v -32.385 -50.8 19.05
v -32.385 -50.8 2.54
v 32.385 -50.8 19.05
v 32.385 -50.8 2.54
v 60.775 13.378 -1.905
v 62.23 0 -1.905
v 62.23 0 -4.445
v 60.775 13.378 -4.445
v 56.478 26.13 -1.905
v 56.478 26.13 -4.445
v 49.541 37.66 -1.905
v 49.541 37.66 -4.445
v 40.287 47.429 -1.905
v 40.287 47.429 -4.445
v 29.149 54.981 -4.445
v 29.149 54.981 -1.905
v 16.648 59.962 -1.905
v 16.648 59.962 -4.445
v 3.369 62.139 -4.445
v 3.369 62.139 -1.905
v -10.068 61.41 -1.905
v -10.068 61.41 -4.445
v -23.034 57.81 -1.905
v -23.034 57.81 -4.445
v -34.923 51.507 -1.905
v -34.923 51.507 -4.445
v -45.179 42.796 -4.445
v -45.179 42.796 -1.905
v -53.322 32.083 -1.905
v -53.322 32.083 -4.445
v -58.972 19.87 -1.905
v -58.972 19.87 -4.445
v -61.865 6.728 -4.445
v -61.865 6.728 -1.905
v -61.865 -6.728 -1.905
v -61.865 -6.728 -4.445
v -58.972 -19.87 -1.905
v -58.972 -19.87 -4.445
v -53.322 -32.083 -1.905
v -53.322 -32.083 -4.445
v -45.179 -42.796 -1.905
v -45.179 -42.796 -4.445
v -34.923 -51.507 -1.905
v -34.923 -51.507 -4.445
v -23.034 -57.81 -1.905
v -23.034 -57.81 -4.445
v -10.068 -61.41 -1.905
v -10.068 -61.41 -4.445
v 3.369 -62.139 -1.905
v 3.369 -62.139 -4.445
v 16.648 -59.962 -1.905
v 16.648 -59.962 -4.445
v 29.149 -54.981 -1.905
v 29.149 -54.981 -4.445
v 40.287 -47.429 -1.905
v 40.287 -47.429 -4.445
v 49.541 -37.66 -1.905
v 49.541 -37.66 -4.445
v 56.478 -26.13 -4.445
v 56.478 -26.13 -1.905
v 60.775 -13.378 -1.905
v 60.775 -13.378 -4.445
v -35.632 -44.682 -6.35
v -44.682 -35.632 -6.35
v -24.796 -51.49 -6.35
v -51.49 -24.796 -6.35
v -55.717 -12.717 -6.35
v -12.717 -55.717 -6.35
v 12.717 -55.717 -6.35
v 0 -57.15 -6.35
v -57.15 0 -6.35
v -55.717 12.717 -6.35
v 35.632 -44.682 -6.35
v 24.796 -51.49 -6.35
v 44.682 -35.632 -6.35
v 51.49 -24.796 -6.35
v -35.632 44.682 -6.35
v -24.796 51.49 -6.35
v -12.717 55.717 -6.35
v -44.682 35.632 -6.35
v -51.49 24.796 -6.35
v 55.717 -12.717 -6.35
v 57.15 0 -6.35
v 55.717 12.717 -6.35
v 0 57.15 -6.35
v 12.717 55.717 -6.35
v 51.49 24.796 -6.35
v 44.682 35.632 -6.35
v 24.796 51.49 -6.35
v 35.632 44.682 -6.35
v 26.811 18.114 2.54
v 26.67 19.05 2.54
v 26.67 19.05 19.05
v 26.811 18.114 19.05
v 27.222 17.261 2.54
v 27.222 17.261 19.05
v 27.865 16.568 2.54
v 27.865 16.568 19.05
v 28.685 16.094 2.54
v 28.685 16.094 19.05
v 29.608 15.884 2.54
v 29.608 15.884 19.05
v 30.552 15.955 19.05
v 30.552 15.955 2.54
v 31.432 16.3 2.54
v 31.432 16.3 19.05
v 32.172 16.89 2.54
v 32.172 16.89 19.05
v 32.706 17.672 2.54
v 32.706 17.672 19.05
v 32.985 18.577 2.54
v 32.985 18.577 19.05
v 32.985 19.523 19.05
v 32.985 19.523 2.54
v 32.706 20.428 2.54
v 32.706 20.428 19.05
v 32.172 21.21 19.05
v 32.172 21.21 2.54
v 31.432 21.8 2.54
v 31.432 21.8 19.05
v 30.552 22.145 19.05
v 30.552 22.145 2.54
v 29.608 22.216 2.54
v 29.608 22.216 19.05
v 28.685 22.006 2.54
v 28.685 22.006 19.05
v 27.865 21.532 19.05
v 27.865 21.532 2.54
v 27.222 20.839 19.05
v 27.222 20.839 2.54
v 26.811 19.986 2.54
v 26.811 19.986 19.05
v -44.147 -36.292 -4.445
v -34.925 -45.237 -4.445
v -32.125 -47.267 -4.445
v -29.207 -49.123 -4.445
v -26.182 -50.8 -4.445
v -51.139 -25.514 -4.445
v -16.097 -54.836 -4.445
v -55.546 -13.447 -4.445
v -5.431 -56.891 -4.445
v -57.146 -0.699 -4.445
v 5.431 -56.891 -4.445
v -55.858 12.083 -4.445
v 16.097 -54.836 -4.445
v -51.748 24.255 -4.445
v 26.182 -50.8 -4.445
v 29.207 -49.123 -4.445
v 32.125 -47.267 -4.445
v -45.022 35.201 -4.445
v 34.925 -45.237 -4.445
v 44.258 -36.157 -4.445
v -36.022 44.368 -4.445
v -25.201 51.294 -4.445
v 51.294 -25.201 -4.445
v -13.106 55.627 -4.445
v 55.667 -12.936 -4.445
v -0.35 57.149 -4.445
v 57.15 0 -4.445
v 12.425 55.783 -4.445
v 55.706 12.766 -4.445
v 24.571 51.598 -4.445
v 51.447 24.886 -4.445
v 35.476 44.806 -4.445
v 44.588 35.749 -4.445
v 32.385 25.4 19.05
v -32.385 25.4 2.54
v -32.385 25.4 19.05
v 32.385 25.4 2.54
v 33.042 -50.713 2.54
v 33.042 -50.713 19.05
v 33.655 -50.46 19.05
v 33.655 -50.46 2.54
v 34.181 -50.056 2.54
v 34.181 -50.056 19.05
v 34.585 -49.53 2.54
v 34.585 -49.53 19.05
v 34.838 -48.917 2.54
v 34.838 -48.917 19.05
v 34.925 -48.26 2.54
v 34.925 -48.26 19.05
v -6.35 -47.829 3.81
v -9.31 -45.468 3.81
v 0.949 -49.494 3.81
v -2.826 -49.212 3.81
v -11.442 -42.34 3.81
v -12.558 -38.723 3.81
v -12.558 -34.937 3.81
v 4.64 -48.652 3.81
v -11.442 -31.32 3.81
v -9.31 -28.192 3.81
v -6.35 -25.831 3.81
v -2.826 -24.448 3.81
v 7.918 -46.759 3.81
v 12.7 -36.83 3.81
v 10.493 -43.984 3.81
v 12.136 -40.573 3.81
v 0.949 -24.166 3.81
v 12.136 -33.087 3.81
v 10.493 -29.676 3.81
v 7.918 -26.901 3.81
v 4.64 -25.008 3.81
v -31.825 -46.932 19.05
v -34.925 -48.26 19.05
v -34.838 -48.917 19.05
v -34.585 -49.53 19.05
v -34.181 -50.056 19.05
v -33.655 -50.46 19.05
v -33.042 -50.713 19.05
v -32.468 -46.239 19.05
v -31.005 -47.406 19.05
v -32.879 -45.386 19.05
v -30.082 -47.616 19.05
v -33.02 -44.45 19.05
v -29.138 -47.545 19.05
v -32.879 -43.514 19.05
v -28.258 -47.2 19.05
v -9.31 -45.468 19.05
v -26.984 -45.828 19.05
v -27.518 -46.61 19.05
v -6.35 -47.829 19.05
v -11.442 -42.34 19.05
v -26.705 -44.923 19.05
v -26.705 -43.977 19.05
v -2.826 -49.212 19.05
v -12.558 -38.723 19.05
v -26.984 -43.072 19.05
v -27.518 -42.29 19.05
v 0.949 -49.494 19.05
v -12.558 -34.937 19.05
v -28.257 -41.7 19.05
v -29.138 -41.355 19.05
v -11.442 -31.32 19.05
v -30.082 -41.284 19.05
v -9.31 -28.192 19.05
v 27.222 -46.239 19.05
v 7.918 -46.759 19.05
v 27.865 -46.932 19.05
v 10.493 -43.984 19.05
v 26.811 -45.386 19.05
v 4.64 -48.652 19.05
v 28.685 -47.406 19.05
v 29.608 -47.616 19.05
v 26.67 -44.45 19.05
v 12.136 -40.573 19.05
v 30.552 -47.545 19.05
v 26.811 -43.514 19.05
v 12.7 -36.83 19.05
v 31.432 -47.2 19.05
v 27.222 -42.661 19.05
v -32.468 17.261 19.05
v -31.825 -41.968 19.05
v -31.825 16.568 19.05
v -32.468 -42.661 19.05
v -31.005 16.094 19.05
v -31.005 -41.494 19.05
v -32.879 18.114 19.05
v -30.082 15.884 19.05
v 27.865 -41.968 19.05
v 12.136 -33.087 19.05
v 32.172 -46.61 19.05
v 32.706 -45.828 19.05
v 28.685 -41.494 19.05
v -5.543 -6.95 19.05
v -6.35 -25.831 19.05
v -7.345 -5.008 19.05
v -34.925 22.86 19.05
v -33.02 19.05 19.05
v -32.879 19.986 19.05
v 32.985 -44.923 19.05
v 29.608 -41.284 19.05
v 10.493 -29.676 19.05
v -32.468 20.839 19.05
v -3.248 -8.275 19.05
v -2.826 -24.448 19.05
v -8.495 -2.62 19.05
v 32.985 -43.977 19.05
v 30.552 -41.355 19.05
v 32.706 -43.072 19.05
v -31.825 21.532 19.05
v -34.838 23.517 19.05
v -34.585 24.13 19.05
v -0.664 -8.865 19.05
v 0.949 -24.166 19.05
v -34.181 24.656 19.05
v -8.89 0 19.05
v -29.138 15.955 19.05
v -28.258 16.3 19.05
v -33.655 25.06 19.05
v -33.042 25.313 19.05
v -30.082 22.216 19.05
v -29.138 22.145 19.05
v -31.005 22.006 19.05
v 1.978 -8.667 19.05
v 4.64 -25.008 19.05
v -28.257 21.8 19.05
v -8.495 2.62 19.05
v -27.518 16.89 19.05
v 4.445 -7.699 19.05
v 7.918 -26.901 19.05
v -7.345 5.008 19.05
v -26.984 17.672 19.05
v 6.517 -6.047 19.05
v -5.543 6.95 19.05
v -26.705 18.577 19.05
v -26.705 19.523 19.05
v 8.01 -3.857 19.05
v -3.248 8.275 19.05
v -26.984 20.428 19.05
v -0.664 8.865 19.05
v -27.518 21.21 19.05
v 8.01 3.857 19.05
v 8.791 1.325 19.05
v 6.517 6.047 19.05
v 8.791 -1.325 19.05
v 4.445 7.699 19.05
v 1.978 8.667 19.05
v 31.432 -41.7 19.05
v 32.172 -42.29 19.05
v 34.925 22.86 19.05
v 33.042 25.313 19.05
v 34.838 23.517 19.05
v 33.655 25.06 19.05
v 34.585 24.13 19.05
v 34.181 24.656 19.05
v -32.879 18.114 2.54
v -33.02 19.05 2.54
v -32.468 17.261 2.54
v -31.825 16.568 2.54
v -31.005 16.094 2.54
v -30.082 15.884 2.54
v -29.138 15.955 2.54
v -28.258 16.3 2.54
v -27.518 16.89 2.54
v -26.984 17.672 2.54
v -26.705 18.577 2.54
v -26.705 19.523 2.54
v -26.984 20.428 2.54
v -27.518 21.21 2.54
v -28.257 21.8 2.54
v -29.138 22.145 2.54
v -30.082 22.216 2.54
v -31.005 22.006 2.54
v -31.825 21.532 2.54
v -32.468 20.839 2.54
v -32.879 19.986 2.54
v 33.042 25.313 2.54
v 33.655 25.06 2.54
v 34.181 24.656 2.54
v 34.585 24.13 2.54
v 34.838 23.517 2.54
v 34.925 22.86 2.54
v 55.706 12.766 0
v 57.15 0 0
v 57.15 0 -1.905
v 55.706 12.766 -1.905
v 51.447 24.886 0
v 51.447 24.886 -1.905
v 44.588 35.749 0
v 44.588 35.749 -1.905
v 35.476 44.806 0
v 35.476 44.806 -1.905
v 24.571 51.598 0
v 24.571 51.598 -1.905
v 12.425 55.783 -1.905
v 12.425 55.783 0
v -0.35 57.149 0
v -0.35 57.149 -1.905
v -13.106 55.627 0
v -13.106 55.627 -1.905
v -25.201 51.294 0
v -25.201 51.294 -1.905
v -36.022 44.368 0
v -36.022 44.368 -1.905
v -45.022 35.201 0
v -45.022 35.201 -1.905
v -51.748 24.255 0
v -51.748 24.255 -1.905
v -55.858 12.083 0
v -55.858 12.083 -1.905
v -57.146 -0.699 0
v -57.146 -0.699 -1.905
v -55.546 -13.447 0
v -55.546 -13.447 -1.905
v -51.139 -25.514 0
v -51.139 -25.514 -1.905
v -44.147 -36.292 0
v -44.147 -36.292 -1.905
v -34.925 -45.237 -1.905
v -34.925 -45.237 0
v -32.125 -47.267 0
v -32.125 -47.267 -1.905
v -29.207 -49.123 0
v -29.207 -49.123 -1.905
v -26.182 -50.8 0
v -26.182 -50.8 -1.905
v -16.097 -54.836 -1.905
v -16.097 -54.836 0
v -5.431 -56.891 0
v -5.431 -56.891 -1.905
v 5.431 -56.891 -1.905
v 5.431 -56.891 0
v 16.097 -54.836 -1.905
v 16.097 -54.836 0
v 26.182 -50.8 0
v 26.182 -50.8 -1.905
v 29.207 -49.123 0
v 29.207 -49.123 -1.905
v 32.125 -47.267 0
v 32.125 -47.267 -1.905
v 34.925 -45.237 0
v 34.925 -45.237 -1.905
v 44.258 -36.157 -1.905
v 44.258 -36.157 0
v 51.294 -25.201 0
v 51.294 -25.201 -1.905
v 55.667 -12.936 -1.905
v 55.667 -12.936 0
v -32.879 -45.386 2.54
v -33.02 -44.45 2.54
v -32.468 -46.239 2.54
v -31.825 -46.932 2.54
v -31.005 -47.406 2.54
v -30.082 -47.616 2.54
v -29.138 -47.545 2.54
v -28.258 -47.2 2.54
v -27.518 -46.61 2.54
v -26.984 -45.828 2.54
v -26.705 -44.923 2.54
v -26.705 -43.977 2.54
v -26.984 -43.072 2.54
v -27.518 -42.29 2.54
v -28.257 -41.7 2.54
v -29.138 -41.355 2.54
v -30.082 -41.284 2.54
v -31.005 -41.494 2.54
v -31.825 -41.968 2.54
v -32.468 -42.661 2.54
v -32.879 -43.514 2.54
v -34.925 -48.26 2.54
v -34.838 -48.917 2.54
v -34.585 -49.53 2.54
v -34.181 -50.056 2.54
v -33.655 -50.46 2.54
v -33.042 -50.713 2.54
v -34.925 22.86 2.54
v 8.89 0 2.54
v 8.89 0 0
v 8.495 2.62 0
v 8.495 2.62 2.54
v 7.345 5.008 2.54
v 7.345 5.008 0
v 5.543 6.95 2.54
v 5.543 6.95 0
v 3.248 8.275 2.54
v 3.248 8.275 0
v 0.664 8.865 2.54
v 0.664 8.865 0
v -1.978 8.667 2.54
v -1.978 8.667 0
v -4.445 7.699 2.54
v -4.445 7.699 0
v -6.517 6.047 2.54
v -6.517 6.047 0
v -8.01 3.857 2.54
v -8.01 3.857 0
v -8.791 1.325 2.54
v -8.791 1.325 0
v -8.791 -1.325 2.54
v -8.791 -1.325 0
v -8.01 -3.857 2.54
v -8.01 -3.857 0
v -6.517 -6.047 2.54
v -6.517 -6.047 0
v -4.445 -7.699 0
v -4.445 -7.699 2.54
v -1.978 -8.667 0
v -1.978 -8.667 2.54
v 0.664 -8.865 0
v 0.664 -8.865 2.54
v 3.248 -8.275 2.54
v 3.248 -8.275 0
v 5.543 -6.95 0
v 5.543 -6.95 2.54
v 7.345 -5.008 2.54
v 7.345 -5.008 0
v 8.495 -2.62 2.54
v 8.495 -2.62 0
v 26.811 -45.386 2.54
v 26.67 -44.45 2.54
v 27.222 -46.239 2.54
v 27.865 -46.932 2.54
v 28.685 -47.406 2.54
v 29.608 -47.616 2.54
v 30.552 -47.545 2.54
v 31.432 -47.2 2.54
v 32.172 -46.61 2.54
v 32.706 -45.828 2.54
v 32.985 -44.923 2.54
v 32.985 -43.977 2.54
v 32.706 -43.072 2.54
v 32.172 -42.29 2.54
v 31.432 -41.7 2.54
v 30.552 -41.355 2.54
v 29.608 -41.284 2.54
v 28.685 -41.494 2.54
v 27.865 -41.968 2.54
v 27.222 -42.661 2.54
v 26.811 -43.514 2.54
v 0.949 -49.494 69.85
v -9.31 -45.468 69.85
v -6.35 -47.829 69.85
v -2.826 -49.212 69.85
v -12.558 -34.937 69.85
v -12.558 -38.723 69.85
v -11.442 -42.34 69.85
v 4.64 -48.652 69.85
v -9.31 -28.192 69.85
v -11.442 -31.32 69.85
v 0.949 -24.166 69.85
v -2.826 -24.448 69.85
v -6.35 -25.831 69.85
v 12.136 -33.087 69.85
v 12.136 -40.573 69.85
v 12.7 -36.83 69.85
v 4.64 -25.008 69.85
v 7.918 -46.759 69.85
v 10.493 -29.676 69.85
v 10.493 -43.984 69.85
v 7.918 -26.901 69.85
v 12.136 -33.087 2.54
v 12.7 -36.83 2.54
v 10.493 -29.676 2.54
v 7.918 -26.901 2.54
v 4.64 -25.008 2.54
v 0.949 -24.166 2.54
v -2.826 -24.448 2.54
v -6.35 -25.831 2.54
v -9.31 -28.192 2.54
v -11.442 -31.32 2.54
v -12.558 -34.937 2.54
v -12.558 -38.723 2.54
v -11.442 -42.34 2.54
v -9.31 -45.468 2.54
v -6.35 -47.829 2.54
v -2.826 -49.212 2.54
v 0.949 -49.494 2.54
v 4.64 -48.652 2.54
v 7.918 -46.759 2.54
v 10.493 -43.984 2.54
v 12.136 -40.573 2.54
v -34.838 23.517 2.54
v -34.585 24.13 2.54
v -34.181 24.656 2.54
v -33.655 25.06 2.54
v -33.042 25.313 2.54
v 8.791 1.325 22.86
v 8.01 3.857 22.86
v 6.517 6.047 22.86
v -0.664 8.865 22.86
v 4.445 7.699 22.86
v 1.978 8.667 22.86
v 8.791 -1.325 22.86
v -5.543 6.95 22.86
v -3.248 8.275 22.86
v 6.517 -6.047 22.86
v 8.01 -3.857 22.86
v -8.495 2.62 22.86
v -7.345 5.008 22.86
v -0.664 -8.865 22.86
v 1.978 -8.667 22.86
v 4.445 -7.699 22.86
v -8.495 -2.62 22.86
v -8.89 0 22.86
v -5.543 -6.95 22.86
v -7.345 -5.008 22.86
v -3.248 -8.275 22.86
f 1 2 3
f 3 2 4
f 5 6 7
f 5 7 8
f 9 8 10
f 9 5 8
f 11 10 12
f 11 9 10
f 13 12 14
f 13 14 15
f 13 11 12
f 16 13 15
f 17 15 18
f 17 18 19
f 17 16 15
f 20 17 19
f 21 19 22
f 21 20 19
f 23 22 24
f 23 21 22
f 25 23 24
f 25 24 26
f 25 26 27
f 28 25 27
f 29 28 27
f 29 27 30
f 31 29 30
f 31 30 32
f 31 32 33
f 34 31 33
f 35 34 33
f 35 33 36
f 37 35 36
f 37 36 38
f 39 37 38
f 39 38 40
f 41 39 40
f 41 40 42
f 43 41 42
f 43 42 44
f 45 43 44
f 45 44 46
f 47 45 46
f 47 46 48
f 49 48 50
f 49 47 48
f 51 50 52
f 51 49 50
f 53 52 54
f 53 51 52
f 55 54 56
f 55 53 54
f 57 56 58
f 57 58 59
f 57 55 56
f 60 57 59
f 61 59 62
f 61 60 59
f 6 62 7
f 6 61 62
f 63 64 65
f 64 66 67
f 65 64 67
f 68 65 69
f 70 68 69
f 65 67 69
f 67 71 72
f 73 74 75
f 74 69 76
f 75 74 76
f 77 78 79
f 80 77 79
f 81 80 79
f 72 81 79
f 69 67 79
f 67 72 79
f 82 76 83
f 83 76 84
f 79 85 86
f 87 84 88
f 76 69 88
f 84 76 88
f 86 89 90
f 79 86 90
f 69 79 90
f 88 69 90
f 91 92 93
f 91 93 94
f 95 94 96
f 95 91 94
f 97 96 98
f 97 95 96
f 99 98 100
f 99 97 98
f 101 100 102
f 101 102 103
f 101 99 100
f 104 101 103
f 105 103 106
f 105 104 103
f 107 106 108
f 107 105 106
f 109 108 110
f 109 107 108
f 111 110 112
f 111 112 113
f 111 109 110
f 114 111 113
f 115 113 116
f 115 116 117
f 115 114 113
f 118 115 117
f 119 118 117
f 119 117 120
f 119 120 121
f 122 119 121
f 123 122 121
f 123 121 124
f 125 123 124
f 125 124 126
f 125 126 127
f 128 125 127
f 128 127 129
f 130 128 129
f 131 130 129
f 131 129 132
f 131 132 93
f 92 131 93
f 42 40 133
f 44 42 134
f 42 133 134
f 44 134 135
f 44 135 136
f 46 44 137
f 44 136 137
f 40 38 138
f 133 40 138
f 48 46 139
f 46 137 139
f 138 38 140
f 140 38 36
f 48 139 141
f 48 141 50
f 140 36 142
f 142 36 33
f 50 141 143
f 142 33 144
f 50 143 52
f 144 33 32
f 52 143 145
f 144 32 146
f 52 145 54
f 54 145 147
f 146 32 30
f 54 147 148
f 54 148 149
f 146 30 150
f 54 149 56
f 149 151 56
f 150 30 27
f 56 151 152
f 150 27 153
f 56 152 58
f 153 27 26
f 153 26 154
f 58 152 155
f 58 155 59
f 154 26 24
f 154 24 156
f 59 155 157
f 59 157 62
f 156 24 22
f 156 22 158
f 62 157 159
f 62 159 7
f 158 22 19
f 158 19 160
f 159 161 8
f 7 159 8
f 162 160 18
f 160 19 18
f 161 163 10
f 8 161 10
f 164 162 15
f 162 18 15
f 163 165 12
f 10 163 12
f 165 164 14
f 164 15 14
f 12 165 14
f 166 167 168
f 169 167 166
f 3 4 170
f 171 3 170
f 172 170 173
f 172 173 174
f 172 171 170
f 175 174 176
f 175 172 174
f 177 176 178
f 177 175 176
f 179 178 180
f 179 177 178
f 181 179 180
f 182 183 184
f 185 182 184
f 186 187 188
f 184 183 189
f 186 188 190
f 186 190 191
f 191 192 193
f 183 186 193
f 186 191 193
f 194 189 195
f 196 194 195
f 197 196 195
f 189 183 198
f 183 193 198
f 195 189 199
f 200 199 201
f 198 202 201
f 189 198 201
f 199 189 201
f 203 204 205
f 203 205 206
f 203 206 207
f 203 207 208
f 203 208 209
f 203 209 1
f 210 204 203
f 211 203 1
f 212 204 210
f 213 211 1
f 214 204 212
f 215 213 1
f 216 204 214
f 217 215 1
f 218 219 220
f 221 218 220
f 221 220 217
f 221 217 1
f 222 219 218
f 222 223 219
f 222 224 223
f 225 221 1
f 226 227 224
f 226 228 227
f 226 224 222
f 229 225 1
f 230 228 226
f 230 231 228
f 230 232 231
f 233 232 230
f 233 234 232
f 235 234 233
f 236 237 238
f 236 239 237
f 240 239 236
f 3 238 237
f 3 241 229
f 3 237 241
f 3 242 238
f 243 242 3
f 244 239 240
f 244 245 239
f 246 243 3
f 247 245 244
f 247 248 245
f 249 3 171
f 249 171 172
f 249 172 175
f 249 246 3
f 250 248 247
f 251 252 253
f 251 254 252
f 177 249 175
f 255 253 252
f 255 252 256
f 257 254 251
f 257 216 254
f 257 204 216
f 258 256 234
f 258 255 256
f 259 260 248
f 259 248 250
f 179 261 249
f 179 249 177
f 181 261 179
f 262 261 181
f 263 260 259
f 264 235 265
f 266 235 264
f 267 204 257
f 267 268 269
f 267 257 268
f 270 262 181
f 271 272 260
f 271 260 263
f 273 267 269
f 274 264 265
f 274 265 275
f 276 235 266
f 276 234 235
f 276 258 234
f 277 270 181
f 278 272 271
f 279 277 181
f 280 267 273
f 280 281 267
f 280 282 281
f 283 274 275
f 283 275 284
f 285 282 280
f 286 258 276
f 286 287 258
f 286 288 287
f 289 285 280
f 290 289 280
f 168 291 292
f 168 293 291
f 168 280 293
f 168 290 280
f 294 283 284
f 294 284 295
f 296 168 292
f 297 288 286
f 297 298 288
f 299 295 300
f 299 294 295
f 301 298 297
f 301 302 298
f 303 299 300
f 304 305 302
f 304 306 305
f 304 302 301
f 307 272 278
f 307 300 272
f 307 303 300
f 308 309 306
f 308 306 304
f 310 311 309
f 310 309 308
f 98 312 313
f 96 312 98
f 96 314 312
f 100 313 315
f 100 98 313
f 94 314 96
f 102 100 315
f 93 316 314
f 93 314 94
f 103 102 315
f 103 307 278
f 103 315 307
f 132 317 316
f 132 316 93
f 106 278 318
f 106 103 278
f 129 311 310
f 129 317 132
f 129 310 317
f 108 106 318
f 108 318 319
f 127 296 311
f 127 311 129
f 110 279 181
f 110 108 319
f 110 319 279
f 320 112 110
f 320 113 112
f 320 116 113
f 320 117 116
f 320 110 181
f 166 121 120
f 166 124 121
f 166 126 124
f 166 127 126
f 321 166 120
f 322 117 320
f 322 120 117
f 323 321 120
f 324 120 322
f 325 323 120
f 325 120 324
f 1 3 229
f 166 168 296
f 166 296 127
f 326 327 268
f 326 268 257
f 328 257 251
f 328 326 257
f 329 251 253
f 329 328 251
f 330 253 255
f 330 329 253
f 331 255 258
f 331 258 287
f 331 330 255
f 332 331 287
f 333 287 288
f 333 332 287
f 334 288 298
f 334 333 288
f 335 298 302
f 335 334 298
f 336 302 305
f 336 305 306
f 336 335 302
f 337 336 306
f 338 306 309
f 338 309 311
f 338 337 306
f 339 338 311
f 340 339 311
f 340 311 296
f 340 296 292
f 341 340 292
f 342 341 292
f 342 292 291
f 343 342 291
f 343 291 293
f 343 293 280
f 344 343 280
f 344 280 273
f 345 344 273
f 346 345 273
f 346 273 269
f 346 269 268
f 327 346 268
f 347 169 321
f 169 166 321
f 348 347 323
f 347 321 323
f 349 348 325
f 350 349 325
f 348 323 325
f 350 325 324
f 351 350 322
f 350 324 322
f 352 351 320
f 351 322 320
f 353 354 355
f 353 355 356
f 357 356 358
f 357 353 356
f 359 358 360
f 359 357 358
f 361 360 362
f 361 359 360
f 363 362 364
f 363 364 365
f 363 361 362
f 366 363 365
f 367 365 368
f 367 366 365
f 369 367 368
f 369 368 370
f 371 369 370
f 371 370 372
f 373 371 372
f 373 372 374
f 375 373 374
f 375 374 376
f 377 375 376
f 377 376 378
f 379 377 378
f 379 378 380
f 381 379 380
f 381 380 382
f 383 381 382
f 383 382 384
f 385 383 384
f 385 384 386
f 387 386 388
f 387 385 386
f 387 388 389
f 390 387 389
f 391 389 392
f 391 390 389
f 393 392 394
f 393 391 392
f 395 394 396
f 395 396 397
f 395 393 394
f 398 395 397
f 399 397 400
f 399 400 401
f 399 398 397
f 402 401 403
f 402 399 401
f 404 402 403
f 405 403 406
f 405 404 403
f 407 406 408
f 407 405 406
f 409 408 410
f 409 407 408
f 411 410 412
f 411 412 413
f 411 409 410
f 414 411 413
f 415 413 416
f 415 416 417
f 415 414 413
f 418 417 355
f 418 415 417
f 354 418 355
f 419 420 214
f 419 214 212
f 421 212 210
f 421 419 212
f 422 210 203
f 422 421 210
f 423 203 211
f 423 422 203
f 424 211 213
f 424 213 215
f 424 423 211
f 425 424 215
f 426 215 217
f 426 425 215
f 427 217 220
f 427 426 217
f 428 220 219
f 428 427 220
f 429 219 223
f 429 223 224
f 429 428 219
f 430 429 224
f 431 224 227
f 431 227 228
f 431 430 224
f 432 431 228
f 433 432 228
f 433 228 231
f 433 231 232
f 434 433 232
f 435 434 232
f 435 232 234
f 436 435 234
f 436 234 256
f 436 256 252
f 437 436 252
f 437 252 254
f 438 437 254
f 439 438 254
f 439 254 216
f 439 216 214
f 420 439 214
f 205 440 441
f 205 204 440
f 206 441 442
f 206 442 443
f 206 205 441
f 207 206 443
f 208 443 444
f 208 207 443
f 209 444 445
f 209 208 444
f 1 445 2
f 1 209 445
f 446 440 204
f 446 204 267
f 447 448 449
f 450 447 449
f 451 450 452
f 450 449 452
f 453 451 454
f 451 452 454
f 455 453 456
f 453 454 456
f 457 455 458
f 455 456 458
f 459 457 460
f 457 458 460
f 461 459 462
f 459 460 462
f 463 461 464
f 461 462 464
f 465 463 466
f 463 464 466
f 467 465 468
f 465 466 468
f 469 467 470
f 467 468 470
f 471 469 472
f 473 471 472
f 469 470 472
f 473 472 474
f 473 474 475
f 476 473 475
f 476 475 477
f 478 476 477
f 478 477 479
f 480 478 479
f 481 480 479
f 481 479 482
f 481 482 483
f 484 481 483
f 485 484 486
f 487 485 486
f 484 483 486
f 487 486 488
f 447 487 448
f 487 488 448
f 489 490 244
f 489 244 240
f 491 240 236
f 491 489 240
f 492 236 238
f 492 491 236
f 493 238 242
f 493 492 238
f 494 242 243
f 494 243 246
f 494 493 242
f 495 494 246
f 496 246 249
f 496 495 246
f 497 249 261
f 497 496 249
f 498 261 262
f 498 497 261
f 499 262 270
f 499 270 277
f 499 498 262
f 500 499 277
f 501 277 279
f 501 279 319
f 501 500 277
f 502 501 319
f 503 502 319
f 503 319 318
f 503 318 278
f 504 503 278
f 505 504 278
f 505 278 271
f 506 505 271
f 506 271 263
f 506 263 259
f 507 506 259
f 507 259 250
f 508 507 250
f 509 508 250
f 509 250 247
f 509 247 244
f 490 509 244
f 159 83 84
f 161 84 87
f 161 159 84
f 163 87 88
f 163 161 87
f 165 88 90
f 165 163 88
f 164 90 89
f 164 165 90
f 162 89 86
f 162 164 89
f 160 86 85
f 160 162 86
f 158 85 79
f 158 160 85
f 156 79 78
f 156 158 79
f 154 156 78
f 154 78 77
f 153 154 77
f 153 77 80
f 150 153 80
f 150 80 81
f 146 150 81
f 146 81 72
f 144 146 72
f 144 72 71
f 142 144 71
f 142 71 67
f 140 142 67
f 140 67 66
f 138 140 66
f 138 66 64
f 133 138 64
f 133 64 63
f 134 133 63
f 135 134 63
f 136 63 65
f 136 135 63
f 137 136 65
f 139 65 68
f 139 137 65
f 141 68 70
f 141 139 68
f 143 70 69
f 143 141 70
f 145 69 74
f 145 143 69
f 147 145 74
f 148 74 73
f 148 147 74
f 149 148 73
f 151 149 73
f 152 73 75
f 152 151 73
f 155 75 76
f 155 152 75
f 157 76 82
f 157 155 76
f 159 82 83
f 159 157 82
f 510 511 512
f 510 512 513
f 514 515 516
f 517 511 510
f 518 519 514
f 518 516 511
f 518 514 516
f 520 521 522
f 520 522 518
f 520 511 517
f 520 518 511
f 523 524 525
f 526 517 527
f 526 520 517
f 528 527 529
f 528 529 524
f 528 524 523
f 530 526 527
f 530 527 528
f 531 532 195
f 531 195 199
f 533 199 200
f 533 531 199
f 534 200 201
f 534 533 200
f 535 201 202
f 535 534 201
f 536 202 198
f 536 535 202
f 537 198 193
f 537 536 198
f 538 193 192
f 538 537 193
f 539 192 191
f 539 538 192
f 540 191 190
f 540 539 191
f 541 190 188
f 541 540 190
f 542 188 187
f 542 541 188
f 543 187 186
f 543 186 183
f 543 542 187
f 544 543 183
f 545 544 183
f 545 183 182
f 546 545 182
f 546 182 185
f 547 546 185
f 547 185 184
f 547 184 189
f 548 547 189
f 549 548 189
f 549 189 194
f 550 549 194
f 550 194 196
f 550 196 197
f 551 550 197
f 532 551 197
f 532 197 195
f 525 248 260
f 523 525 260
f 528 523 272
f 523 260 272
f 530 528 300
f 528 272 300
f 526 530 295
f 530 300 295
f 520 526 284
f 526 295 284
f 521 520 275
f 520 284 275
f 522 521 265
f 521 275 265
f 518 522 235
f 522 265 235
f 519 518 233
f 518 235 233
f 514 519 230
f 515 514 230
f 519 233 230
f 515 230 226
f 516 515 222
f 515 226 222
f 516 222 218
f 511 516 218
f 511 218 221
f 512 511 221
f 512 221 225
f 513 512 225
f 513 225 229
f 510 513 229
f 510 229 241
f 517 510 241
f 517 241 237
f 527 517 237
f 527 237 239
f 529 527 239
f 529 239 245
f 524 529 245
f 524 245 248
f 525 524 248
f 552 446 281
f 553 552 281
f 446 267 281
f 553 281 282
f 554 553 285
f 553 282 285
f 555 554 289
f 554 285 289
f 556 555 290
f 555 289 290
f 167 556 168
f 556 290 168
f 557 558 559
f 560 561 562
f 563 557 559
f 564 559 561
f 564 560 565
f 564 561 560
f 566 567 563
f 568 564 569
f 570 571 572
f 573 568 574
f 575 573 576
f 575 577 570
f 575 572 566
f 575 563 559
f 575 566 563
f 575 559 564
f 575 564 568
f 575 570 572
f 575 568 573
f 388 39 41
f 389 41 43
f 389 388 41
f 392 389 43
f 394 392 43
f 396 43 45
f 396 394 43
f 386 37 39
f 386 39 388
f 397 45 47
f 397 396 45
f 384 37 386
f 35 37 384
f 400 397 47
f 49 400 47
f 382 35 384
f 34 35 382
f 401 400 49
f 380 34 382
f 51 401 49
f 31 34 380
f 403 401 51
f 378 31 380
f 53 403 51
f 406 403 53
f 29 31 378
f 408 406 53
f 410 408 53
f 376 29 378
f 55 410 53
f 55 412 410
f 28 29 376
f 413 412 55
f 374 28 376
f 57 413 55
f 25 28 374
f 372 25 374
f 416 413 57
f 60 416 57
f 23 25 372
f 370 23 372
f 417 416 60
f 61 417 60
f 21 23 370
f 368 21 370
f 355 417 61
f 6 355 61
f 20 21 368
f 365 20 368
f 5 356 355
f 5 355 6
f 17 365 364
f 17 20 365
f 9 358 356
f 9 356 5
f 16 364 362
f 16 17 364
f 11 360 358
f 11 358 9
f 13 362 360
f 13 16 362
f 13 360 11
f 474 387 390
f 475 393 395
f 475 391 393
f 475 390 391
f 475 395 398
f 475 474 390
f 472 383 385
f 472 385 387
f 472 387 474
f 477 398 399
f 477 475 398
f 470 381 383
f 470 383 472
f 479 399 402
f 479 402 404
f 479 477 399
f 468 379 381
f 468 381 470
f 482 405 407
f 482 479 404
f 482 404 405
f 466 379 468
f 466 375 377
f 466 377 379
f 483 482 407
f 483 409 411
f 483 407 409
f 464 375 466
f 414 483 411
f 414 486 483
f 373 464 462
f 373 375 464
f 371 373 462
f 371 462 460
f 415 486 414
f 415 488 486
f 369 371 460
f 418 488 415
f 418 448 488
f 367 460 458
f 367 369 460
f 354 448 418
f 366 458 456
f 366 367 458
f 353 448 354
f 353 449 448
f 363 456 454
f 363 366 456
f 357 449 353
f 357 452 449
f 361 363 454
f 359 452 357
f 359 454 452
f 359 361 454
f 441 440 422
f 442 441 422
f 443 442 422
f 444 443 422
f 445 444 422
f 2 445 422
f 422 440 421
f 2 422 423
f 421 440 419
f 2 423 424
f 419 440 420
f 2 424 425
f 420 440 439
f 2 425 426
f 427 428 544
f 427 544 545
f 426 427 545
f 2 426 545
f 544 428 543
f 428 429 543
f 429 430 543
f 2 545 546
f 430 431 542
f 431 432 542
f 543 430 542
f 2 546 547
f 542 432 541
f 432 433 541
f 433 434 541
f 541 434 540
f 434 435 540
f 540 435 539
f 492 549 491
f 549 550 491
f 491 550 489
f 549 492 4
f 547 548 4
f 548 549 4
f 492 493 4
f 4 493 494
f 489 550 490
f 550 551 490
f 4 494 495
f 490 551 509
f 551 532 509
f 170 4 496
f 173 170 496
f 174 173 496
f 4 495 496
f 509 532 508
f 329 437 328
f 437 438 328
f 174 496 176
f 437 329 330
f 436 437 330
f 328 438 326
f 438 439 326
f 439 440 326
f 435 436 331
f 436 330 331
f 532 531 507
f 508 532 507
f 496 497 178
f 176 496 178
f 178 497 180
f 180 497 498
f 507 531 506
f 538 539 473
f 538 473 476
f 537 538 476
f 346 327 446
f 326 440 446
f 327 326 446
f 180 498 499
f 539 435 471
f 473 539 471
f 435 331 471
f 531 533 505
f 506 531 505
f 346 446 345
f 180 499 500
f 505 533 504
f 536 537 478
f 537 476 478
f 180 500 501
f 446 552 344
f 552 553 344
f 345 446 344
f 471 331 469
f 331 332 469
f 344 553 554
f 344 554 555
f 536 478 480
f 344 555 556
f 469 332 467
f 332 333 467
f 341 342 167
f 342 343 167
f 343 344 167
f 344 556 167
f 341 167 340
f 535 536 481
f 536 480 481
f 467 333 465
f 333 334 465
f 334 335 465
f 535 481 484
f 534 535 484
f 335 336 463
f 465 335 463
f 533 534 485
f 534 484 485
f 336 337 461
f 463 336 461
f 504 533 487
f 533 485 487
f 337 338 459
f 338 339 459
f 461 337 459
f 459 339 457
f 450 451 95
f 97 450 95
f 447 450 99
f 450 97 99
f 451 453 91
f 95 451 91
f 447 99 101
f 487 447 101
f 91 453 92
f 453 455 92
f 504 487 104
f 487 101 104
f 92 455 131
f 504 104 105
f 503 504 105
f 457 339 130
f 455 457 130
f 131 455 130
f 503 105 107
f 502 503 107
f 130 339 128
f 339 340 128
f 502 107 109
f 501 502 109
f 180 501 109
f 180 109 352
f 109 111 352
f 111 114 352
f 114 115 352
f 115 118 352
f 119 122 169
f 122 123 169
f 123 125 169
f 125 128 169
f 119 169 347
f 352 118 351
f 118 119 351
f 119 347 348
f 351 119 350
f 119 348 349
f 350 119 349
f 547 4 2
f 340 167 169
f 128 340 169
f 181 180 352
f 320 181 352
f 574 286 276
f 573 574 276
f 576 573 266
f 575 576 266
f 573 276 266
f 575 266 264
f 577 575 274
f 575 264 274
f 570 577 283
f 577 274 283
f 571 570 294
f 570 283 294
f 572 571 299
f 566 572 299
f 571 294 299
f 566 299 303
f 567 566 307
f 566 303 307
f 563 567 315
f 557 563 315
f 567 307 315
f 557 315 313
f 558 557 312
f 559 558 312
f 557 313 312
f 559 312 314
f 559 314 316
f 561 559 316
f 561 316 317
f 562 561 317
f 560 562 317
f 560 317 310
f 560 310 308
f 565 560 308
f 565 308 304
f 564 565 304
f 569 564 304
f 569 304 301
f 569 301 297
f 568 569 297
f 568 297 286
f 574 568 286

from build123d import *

# Parameters (mm, degrees)
SKETCH1_R           = 57.15
BOSS_EXTRUDE1_DEPTH = 6.35
SKETCH1_5_R         = 62.23
SKETCH1_5_R_2       = 57.15
BOSS_EXTRUDE2_DEPTH = 4.445
SKETCH1_6_R         = 62.23
SKETCH1_6_R_2       = 57.15
CUT_EXTRUDE1_DEPTH  = 1.905
SKETCH1_12_R        = 12.7
BOSS_EXTRUDE5_DEPTH = 69.85
SKETCH1_13_R        = 12.7
CUT_EXTRUDE3_DEPTH  = 3.81
SKETCH1_17_W        = 69.85
SKETCH1_17_H        = 76.2
SKETCH1_17_R        = 3.175
SKETCH1_17_R_2      = 12.7
SKETCH1_17_R_3      = 8.89
BOSS_EXTRUDE8_DEPTH = 19.05
SKETCH1_18_R        = 8.89
BOSS_EXTRUDE9_DEPTH = 22.86
SKETCH1_22_W        = 69.85
SKETCH1_22_H        = 76.2
SKETCH1_22_R        = 3.175
SKETCH1_22_R_2      = 12.7
SKETCH1_22_R_3      = 8.89
CUT_EXTRUDE6_DEPTH  = 2.54
FILLET1_R           = 2.54


with BuildPart() as part:
    # Sketch1 → Boss-Extrude1 (new body)
    with BuildSketch(Plane.XY):
        Circle(SKETCH1_R)
    extrude(amount=-BOSS_EXTRUDE1_DEPTH)

    # Sketch1<5> → Boss-Extrude2 (add)
    with BuildSketch(Plane.XY):
        Circle(SKETCH1_5_R)
        Circle(SKETCH1_5_R_2, mode=Mode.SUBTRACT)
    extrude(amount=-BOSS_EXTRUDE2_DEPTH)

    # Sketch1<6> → Cut-Extrude1 (cut)
    with BuildSketch(Plane.XY):
        Circle(SKETCH1_6_R)
        Circle(SKETCH1_6_R_2, mode=Mode.SUBTRACT)
    extrude(amount=-CUT_EXTRUDE1_DEPTH, mode=Mode.SUBTRACT)

    # Sketch1<12> → Boss-Extrude5 (add)
    with BuildSketch(Plane.XY):
        with Locations((0, -36.83)):
            Circle(SKETCH1_12_R)
    extrude(amount=BOSS_EXTRUDE5_DEPTH)

    # Sketch1<13> → Cut-Extrude3 (cut)
    with BuildSketch(Plane.XY):
        with Locations((0, -36.83)):
            Circle(SKETCH1_13_R)
    extrude(amount=CUT_EXTRUDE3_DEPTH, mode=Mode.SUBTRACT)


with BuildPart() as cut_extrude3_piece_1:
    # of the separate pieces the step leaves, piece 1, a body of its own (cut_extrude3_pieces)
    add(part.part.solids().sort_by_distance((57.15, 0, -4.445))[0])



with BuildPart() as cut_extrude3_piece_2:
    # of the separate pieces the step leaves, piece 2, a body of its own (cut_extrude3_pieces)
    add(part.part.solids().sort_by_distance((12.7, -36.83, 3.81))[0])


with BuildPart() as cut_extrude3_piece_1_1:
    add(cut_extrude3_piece_1.part)

    add(cut_extrude3_piece_2.part)  # Boss-Extrude8 merges Cut-Extrude3 piece 2
    # Sketch1<17> → Boss-Extrude8 (add)
    with BuildSketch(Plane.XY):
        with Locations((0, -12.7)):
            Rectangle(SKETCH1_17_W, SKETCH1_17_H)
        with Locations((29.845, 19.05)):
            Circle(SKETCH1_17_R, mode=Mode.SUBTRACT)
        with Locations((-29.845, -44.45)):
            Circle(SKETCH1_17_R, mode=Mode.SUBTRACT)
        with Locations((0, -36.83)):
            Circle(SKETCH1_17_R_2, mode=Mode.SUBTRACT)
        Circle(SKETCH1_17_R_3, mode=Mode.SUBTRACT)
        with Locations((29.845, -44.45)):
            Circle(SKETCH1_17_R, mode=Mode.SUBTRACT)
        with Locations((-29.845, 19.05)):
            Circle(SKETCH1_17_R, mode=Mode.SUBTRACT)
    extrude(amount=BOSS_EXTRUDE8_DEPTH)

    # Sketch1<18> → Boss-Extrude9 (add)
    with BuildSketch(Plane.XY):
        Circle(SKETCH1_18_R)
    extrude(amount=BOSS_EXTRUDE9_DEPTH)

    # Sketch1<22> → Cut-Extrude6 (cut)
    with BuildSketch(Plane.XY):
        with Locations((0, -12.7)):
            Rectangle(SKETCH1_22_W, SKETCH1_22_H)
        with Locations((29.845, 19.05)):
            Circle(SKETCH1_22_R, mode=Mode.SUBTRACT)
        with Locations((-29.845, -44.45)):
            Circle(SKETCH1_22_R, mode=Mode.SUBTRACT)
        with Locations((0, -36.83)):
            Circle(SKETCH1_22_R_2, mode=Mode.SUBTRACT)
        Circle(SKETCH1_22_R_3, mode=Mode.SUBTRACT)
        with Locations((29.845, -44.45)):
            Circle(SKETCH1_22_R, mode=Mode.SUBTRACT)
        with Locations((-29.845, 19.05)):
            Circle(SKETCH1_22_R, mode=Mode.SUBTRACT)
    extrude(amount=CUT_EXTRUDE6_DEPTH, mode=Mode.SUBTRACT)

    # Fillet1
    fillet1_edges = [cut_extrude3_piece_1_1.edges().sort_by_distance(p)[0] for p in [
        (-34.925, -50.8, 10.795),
        (34.925, -50.8, 10.795),
        (34.925, 25.4, 10.795),
        (-34.925, 25.4, 10.795),
    ]]
    fillet(fillet1_edges, radius=FILLET1_R)


solid = cut_extrude3_piece_1_1.part
